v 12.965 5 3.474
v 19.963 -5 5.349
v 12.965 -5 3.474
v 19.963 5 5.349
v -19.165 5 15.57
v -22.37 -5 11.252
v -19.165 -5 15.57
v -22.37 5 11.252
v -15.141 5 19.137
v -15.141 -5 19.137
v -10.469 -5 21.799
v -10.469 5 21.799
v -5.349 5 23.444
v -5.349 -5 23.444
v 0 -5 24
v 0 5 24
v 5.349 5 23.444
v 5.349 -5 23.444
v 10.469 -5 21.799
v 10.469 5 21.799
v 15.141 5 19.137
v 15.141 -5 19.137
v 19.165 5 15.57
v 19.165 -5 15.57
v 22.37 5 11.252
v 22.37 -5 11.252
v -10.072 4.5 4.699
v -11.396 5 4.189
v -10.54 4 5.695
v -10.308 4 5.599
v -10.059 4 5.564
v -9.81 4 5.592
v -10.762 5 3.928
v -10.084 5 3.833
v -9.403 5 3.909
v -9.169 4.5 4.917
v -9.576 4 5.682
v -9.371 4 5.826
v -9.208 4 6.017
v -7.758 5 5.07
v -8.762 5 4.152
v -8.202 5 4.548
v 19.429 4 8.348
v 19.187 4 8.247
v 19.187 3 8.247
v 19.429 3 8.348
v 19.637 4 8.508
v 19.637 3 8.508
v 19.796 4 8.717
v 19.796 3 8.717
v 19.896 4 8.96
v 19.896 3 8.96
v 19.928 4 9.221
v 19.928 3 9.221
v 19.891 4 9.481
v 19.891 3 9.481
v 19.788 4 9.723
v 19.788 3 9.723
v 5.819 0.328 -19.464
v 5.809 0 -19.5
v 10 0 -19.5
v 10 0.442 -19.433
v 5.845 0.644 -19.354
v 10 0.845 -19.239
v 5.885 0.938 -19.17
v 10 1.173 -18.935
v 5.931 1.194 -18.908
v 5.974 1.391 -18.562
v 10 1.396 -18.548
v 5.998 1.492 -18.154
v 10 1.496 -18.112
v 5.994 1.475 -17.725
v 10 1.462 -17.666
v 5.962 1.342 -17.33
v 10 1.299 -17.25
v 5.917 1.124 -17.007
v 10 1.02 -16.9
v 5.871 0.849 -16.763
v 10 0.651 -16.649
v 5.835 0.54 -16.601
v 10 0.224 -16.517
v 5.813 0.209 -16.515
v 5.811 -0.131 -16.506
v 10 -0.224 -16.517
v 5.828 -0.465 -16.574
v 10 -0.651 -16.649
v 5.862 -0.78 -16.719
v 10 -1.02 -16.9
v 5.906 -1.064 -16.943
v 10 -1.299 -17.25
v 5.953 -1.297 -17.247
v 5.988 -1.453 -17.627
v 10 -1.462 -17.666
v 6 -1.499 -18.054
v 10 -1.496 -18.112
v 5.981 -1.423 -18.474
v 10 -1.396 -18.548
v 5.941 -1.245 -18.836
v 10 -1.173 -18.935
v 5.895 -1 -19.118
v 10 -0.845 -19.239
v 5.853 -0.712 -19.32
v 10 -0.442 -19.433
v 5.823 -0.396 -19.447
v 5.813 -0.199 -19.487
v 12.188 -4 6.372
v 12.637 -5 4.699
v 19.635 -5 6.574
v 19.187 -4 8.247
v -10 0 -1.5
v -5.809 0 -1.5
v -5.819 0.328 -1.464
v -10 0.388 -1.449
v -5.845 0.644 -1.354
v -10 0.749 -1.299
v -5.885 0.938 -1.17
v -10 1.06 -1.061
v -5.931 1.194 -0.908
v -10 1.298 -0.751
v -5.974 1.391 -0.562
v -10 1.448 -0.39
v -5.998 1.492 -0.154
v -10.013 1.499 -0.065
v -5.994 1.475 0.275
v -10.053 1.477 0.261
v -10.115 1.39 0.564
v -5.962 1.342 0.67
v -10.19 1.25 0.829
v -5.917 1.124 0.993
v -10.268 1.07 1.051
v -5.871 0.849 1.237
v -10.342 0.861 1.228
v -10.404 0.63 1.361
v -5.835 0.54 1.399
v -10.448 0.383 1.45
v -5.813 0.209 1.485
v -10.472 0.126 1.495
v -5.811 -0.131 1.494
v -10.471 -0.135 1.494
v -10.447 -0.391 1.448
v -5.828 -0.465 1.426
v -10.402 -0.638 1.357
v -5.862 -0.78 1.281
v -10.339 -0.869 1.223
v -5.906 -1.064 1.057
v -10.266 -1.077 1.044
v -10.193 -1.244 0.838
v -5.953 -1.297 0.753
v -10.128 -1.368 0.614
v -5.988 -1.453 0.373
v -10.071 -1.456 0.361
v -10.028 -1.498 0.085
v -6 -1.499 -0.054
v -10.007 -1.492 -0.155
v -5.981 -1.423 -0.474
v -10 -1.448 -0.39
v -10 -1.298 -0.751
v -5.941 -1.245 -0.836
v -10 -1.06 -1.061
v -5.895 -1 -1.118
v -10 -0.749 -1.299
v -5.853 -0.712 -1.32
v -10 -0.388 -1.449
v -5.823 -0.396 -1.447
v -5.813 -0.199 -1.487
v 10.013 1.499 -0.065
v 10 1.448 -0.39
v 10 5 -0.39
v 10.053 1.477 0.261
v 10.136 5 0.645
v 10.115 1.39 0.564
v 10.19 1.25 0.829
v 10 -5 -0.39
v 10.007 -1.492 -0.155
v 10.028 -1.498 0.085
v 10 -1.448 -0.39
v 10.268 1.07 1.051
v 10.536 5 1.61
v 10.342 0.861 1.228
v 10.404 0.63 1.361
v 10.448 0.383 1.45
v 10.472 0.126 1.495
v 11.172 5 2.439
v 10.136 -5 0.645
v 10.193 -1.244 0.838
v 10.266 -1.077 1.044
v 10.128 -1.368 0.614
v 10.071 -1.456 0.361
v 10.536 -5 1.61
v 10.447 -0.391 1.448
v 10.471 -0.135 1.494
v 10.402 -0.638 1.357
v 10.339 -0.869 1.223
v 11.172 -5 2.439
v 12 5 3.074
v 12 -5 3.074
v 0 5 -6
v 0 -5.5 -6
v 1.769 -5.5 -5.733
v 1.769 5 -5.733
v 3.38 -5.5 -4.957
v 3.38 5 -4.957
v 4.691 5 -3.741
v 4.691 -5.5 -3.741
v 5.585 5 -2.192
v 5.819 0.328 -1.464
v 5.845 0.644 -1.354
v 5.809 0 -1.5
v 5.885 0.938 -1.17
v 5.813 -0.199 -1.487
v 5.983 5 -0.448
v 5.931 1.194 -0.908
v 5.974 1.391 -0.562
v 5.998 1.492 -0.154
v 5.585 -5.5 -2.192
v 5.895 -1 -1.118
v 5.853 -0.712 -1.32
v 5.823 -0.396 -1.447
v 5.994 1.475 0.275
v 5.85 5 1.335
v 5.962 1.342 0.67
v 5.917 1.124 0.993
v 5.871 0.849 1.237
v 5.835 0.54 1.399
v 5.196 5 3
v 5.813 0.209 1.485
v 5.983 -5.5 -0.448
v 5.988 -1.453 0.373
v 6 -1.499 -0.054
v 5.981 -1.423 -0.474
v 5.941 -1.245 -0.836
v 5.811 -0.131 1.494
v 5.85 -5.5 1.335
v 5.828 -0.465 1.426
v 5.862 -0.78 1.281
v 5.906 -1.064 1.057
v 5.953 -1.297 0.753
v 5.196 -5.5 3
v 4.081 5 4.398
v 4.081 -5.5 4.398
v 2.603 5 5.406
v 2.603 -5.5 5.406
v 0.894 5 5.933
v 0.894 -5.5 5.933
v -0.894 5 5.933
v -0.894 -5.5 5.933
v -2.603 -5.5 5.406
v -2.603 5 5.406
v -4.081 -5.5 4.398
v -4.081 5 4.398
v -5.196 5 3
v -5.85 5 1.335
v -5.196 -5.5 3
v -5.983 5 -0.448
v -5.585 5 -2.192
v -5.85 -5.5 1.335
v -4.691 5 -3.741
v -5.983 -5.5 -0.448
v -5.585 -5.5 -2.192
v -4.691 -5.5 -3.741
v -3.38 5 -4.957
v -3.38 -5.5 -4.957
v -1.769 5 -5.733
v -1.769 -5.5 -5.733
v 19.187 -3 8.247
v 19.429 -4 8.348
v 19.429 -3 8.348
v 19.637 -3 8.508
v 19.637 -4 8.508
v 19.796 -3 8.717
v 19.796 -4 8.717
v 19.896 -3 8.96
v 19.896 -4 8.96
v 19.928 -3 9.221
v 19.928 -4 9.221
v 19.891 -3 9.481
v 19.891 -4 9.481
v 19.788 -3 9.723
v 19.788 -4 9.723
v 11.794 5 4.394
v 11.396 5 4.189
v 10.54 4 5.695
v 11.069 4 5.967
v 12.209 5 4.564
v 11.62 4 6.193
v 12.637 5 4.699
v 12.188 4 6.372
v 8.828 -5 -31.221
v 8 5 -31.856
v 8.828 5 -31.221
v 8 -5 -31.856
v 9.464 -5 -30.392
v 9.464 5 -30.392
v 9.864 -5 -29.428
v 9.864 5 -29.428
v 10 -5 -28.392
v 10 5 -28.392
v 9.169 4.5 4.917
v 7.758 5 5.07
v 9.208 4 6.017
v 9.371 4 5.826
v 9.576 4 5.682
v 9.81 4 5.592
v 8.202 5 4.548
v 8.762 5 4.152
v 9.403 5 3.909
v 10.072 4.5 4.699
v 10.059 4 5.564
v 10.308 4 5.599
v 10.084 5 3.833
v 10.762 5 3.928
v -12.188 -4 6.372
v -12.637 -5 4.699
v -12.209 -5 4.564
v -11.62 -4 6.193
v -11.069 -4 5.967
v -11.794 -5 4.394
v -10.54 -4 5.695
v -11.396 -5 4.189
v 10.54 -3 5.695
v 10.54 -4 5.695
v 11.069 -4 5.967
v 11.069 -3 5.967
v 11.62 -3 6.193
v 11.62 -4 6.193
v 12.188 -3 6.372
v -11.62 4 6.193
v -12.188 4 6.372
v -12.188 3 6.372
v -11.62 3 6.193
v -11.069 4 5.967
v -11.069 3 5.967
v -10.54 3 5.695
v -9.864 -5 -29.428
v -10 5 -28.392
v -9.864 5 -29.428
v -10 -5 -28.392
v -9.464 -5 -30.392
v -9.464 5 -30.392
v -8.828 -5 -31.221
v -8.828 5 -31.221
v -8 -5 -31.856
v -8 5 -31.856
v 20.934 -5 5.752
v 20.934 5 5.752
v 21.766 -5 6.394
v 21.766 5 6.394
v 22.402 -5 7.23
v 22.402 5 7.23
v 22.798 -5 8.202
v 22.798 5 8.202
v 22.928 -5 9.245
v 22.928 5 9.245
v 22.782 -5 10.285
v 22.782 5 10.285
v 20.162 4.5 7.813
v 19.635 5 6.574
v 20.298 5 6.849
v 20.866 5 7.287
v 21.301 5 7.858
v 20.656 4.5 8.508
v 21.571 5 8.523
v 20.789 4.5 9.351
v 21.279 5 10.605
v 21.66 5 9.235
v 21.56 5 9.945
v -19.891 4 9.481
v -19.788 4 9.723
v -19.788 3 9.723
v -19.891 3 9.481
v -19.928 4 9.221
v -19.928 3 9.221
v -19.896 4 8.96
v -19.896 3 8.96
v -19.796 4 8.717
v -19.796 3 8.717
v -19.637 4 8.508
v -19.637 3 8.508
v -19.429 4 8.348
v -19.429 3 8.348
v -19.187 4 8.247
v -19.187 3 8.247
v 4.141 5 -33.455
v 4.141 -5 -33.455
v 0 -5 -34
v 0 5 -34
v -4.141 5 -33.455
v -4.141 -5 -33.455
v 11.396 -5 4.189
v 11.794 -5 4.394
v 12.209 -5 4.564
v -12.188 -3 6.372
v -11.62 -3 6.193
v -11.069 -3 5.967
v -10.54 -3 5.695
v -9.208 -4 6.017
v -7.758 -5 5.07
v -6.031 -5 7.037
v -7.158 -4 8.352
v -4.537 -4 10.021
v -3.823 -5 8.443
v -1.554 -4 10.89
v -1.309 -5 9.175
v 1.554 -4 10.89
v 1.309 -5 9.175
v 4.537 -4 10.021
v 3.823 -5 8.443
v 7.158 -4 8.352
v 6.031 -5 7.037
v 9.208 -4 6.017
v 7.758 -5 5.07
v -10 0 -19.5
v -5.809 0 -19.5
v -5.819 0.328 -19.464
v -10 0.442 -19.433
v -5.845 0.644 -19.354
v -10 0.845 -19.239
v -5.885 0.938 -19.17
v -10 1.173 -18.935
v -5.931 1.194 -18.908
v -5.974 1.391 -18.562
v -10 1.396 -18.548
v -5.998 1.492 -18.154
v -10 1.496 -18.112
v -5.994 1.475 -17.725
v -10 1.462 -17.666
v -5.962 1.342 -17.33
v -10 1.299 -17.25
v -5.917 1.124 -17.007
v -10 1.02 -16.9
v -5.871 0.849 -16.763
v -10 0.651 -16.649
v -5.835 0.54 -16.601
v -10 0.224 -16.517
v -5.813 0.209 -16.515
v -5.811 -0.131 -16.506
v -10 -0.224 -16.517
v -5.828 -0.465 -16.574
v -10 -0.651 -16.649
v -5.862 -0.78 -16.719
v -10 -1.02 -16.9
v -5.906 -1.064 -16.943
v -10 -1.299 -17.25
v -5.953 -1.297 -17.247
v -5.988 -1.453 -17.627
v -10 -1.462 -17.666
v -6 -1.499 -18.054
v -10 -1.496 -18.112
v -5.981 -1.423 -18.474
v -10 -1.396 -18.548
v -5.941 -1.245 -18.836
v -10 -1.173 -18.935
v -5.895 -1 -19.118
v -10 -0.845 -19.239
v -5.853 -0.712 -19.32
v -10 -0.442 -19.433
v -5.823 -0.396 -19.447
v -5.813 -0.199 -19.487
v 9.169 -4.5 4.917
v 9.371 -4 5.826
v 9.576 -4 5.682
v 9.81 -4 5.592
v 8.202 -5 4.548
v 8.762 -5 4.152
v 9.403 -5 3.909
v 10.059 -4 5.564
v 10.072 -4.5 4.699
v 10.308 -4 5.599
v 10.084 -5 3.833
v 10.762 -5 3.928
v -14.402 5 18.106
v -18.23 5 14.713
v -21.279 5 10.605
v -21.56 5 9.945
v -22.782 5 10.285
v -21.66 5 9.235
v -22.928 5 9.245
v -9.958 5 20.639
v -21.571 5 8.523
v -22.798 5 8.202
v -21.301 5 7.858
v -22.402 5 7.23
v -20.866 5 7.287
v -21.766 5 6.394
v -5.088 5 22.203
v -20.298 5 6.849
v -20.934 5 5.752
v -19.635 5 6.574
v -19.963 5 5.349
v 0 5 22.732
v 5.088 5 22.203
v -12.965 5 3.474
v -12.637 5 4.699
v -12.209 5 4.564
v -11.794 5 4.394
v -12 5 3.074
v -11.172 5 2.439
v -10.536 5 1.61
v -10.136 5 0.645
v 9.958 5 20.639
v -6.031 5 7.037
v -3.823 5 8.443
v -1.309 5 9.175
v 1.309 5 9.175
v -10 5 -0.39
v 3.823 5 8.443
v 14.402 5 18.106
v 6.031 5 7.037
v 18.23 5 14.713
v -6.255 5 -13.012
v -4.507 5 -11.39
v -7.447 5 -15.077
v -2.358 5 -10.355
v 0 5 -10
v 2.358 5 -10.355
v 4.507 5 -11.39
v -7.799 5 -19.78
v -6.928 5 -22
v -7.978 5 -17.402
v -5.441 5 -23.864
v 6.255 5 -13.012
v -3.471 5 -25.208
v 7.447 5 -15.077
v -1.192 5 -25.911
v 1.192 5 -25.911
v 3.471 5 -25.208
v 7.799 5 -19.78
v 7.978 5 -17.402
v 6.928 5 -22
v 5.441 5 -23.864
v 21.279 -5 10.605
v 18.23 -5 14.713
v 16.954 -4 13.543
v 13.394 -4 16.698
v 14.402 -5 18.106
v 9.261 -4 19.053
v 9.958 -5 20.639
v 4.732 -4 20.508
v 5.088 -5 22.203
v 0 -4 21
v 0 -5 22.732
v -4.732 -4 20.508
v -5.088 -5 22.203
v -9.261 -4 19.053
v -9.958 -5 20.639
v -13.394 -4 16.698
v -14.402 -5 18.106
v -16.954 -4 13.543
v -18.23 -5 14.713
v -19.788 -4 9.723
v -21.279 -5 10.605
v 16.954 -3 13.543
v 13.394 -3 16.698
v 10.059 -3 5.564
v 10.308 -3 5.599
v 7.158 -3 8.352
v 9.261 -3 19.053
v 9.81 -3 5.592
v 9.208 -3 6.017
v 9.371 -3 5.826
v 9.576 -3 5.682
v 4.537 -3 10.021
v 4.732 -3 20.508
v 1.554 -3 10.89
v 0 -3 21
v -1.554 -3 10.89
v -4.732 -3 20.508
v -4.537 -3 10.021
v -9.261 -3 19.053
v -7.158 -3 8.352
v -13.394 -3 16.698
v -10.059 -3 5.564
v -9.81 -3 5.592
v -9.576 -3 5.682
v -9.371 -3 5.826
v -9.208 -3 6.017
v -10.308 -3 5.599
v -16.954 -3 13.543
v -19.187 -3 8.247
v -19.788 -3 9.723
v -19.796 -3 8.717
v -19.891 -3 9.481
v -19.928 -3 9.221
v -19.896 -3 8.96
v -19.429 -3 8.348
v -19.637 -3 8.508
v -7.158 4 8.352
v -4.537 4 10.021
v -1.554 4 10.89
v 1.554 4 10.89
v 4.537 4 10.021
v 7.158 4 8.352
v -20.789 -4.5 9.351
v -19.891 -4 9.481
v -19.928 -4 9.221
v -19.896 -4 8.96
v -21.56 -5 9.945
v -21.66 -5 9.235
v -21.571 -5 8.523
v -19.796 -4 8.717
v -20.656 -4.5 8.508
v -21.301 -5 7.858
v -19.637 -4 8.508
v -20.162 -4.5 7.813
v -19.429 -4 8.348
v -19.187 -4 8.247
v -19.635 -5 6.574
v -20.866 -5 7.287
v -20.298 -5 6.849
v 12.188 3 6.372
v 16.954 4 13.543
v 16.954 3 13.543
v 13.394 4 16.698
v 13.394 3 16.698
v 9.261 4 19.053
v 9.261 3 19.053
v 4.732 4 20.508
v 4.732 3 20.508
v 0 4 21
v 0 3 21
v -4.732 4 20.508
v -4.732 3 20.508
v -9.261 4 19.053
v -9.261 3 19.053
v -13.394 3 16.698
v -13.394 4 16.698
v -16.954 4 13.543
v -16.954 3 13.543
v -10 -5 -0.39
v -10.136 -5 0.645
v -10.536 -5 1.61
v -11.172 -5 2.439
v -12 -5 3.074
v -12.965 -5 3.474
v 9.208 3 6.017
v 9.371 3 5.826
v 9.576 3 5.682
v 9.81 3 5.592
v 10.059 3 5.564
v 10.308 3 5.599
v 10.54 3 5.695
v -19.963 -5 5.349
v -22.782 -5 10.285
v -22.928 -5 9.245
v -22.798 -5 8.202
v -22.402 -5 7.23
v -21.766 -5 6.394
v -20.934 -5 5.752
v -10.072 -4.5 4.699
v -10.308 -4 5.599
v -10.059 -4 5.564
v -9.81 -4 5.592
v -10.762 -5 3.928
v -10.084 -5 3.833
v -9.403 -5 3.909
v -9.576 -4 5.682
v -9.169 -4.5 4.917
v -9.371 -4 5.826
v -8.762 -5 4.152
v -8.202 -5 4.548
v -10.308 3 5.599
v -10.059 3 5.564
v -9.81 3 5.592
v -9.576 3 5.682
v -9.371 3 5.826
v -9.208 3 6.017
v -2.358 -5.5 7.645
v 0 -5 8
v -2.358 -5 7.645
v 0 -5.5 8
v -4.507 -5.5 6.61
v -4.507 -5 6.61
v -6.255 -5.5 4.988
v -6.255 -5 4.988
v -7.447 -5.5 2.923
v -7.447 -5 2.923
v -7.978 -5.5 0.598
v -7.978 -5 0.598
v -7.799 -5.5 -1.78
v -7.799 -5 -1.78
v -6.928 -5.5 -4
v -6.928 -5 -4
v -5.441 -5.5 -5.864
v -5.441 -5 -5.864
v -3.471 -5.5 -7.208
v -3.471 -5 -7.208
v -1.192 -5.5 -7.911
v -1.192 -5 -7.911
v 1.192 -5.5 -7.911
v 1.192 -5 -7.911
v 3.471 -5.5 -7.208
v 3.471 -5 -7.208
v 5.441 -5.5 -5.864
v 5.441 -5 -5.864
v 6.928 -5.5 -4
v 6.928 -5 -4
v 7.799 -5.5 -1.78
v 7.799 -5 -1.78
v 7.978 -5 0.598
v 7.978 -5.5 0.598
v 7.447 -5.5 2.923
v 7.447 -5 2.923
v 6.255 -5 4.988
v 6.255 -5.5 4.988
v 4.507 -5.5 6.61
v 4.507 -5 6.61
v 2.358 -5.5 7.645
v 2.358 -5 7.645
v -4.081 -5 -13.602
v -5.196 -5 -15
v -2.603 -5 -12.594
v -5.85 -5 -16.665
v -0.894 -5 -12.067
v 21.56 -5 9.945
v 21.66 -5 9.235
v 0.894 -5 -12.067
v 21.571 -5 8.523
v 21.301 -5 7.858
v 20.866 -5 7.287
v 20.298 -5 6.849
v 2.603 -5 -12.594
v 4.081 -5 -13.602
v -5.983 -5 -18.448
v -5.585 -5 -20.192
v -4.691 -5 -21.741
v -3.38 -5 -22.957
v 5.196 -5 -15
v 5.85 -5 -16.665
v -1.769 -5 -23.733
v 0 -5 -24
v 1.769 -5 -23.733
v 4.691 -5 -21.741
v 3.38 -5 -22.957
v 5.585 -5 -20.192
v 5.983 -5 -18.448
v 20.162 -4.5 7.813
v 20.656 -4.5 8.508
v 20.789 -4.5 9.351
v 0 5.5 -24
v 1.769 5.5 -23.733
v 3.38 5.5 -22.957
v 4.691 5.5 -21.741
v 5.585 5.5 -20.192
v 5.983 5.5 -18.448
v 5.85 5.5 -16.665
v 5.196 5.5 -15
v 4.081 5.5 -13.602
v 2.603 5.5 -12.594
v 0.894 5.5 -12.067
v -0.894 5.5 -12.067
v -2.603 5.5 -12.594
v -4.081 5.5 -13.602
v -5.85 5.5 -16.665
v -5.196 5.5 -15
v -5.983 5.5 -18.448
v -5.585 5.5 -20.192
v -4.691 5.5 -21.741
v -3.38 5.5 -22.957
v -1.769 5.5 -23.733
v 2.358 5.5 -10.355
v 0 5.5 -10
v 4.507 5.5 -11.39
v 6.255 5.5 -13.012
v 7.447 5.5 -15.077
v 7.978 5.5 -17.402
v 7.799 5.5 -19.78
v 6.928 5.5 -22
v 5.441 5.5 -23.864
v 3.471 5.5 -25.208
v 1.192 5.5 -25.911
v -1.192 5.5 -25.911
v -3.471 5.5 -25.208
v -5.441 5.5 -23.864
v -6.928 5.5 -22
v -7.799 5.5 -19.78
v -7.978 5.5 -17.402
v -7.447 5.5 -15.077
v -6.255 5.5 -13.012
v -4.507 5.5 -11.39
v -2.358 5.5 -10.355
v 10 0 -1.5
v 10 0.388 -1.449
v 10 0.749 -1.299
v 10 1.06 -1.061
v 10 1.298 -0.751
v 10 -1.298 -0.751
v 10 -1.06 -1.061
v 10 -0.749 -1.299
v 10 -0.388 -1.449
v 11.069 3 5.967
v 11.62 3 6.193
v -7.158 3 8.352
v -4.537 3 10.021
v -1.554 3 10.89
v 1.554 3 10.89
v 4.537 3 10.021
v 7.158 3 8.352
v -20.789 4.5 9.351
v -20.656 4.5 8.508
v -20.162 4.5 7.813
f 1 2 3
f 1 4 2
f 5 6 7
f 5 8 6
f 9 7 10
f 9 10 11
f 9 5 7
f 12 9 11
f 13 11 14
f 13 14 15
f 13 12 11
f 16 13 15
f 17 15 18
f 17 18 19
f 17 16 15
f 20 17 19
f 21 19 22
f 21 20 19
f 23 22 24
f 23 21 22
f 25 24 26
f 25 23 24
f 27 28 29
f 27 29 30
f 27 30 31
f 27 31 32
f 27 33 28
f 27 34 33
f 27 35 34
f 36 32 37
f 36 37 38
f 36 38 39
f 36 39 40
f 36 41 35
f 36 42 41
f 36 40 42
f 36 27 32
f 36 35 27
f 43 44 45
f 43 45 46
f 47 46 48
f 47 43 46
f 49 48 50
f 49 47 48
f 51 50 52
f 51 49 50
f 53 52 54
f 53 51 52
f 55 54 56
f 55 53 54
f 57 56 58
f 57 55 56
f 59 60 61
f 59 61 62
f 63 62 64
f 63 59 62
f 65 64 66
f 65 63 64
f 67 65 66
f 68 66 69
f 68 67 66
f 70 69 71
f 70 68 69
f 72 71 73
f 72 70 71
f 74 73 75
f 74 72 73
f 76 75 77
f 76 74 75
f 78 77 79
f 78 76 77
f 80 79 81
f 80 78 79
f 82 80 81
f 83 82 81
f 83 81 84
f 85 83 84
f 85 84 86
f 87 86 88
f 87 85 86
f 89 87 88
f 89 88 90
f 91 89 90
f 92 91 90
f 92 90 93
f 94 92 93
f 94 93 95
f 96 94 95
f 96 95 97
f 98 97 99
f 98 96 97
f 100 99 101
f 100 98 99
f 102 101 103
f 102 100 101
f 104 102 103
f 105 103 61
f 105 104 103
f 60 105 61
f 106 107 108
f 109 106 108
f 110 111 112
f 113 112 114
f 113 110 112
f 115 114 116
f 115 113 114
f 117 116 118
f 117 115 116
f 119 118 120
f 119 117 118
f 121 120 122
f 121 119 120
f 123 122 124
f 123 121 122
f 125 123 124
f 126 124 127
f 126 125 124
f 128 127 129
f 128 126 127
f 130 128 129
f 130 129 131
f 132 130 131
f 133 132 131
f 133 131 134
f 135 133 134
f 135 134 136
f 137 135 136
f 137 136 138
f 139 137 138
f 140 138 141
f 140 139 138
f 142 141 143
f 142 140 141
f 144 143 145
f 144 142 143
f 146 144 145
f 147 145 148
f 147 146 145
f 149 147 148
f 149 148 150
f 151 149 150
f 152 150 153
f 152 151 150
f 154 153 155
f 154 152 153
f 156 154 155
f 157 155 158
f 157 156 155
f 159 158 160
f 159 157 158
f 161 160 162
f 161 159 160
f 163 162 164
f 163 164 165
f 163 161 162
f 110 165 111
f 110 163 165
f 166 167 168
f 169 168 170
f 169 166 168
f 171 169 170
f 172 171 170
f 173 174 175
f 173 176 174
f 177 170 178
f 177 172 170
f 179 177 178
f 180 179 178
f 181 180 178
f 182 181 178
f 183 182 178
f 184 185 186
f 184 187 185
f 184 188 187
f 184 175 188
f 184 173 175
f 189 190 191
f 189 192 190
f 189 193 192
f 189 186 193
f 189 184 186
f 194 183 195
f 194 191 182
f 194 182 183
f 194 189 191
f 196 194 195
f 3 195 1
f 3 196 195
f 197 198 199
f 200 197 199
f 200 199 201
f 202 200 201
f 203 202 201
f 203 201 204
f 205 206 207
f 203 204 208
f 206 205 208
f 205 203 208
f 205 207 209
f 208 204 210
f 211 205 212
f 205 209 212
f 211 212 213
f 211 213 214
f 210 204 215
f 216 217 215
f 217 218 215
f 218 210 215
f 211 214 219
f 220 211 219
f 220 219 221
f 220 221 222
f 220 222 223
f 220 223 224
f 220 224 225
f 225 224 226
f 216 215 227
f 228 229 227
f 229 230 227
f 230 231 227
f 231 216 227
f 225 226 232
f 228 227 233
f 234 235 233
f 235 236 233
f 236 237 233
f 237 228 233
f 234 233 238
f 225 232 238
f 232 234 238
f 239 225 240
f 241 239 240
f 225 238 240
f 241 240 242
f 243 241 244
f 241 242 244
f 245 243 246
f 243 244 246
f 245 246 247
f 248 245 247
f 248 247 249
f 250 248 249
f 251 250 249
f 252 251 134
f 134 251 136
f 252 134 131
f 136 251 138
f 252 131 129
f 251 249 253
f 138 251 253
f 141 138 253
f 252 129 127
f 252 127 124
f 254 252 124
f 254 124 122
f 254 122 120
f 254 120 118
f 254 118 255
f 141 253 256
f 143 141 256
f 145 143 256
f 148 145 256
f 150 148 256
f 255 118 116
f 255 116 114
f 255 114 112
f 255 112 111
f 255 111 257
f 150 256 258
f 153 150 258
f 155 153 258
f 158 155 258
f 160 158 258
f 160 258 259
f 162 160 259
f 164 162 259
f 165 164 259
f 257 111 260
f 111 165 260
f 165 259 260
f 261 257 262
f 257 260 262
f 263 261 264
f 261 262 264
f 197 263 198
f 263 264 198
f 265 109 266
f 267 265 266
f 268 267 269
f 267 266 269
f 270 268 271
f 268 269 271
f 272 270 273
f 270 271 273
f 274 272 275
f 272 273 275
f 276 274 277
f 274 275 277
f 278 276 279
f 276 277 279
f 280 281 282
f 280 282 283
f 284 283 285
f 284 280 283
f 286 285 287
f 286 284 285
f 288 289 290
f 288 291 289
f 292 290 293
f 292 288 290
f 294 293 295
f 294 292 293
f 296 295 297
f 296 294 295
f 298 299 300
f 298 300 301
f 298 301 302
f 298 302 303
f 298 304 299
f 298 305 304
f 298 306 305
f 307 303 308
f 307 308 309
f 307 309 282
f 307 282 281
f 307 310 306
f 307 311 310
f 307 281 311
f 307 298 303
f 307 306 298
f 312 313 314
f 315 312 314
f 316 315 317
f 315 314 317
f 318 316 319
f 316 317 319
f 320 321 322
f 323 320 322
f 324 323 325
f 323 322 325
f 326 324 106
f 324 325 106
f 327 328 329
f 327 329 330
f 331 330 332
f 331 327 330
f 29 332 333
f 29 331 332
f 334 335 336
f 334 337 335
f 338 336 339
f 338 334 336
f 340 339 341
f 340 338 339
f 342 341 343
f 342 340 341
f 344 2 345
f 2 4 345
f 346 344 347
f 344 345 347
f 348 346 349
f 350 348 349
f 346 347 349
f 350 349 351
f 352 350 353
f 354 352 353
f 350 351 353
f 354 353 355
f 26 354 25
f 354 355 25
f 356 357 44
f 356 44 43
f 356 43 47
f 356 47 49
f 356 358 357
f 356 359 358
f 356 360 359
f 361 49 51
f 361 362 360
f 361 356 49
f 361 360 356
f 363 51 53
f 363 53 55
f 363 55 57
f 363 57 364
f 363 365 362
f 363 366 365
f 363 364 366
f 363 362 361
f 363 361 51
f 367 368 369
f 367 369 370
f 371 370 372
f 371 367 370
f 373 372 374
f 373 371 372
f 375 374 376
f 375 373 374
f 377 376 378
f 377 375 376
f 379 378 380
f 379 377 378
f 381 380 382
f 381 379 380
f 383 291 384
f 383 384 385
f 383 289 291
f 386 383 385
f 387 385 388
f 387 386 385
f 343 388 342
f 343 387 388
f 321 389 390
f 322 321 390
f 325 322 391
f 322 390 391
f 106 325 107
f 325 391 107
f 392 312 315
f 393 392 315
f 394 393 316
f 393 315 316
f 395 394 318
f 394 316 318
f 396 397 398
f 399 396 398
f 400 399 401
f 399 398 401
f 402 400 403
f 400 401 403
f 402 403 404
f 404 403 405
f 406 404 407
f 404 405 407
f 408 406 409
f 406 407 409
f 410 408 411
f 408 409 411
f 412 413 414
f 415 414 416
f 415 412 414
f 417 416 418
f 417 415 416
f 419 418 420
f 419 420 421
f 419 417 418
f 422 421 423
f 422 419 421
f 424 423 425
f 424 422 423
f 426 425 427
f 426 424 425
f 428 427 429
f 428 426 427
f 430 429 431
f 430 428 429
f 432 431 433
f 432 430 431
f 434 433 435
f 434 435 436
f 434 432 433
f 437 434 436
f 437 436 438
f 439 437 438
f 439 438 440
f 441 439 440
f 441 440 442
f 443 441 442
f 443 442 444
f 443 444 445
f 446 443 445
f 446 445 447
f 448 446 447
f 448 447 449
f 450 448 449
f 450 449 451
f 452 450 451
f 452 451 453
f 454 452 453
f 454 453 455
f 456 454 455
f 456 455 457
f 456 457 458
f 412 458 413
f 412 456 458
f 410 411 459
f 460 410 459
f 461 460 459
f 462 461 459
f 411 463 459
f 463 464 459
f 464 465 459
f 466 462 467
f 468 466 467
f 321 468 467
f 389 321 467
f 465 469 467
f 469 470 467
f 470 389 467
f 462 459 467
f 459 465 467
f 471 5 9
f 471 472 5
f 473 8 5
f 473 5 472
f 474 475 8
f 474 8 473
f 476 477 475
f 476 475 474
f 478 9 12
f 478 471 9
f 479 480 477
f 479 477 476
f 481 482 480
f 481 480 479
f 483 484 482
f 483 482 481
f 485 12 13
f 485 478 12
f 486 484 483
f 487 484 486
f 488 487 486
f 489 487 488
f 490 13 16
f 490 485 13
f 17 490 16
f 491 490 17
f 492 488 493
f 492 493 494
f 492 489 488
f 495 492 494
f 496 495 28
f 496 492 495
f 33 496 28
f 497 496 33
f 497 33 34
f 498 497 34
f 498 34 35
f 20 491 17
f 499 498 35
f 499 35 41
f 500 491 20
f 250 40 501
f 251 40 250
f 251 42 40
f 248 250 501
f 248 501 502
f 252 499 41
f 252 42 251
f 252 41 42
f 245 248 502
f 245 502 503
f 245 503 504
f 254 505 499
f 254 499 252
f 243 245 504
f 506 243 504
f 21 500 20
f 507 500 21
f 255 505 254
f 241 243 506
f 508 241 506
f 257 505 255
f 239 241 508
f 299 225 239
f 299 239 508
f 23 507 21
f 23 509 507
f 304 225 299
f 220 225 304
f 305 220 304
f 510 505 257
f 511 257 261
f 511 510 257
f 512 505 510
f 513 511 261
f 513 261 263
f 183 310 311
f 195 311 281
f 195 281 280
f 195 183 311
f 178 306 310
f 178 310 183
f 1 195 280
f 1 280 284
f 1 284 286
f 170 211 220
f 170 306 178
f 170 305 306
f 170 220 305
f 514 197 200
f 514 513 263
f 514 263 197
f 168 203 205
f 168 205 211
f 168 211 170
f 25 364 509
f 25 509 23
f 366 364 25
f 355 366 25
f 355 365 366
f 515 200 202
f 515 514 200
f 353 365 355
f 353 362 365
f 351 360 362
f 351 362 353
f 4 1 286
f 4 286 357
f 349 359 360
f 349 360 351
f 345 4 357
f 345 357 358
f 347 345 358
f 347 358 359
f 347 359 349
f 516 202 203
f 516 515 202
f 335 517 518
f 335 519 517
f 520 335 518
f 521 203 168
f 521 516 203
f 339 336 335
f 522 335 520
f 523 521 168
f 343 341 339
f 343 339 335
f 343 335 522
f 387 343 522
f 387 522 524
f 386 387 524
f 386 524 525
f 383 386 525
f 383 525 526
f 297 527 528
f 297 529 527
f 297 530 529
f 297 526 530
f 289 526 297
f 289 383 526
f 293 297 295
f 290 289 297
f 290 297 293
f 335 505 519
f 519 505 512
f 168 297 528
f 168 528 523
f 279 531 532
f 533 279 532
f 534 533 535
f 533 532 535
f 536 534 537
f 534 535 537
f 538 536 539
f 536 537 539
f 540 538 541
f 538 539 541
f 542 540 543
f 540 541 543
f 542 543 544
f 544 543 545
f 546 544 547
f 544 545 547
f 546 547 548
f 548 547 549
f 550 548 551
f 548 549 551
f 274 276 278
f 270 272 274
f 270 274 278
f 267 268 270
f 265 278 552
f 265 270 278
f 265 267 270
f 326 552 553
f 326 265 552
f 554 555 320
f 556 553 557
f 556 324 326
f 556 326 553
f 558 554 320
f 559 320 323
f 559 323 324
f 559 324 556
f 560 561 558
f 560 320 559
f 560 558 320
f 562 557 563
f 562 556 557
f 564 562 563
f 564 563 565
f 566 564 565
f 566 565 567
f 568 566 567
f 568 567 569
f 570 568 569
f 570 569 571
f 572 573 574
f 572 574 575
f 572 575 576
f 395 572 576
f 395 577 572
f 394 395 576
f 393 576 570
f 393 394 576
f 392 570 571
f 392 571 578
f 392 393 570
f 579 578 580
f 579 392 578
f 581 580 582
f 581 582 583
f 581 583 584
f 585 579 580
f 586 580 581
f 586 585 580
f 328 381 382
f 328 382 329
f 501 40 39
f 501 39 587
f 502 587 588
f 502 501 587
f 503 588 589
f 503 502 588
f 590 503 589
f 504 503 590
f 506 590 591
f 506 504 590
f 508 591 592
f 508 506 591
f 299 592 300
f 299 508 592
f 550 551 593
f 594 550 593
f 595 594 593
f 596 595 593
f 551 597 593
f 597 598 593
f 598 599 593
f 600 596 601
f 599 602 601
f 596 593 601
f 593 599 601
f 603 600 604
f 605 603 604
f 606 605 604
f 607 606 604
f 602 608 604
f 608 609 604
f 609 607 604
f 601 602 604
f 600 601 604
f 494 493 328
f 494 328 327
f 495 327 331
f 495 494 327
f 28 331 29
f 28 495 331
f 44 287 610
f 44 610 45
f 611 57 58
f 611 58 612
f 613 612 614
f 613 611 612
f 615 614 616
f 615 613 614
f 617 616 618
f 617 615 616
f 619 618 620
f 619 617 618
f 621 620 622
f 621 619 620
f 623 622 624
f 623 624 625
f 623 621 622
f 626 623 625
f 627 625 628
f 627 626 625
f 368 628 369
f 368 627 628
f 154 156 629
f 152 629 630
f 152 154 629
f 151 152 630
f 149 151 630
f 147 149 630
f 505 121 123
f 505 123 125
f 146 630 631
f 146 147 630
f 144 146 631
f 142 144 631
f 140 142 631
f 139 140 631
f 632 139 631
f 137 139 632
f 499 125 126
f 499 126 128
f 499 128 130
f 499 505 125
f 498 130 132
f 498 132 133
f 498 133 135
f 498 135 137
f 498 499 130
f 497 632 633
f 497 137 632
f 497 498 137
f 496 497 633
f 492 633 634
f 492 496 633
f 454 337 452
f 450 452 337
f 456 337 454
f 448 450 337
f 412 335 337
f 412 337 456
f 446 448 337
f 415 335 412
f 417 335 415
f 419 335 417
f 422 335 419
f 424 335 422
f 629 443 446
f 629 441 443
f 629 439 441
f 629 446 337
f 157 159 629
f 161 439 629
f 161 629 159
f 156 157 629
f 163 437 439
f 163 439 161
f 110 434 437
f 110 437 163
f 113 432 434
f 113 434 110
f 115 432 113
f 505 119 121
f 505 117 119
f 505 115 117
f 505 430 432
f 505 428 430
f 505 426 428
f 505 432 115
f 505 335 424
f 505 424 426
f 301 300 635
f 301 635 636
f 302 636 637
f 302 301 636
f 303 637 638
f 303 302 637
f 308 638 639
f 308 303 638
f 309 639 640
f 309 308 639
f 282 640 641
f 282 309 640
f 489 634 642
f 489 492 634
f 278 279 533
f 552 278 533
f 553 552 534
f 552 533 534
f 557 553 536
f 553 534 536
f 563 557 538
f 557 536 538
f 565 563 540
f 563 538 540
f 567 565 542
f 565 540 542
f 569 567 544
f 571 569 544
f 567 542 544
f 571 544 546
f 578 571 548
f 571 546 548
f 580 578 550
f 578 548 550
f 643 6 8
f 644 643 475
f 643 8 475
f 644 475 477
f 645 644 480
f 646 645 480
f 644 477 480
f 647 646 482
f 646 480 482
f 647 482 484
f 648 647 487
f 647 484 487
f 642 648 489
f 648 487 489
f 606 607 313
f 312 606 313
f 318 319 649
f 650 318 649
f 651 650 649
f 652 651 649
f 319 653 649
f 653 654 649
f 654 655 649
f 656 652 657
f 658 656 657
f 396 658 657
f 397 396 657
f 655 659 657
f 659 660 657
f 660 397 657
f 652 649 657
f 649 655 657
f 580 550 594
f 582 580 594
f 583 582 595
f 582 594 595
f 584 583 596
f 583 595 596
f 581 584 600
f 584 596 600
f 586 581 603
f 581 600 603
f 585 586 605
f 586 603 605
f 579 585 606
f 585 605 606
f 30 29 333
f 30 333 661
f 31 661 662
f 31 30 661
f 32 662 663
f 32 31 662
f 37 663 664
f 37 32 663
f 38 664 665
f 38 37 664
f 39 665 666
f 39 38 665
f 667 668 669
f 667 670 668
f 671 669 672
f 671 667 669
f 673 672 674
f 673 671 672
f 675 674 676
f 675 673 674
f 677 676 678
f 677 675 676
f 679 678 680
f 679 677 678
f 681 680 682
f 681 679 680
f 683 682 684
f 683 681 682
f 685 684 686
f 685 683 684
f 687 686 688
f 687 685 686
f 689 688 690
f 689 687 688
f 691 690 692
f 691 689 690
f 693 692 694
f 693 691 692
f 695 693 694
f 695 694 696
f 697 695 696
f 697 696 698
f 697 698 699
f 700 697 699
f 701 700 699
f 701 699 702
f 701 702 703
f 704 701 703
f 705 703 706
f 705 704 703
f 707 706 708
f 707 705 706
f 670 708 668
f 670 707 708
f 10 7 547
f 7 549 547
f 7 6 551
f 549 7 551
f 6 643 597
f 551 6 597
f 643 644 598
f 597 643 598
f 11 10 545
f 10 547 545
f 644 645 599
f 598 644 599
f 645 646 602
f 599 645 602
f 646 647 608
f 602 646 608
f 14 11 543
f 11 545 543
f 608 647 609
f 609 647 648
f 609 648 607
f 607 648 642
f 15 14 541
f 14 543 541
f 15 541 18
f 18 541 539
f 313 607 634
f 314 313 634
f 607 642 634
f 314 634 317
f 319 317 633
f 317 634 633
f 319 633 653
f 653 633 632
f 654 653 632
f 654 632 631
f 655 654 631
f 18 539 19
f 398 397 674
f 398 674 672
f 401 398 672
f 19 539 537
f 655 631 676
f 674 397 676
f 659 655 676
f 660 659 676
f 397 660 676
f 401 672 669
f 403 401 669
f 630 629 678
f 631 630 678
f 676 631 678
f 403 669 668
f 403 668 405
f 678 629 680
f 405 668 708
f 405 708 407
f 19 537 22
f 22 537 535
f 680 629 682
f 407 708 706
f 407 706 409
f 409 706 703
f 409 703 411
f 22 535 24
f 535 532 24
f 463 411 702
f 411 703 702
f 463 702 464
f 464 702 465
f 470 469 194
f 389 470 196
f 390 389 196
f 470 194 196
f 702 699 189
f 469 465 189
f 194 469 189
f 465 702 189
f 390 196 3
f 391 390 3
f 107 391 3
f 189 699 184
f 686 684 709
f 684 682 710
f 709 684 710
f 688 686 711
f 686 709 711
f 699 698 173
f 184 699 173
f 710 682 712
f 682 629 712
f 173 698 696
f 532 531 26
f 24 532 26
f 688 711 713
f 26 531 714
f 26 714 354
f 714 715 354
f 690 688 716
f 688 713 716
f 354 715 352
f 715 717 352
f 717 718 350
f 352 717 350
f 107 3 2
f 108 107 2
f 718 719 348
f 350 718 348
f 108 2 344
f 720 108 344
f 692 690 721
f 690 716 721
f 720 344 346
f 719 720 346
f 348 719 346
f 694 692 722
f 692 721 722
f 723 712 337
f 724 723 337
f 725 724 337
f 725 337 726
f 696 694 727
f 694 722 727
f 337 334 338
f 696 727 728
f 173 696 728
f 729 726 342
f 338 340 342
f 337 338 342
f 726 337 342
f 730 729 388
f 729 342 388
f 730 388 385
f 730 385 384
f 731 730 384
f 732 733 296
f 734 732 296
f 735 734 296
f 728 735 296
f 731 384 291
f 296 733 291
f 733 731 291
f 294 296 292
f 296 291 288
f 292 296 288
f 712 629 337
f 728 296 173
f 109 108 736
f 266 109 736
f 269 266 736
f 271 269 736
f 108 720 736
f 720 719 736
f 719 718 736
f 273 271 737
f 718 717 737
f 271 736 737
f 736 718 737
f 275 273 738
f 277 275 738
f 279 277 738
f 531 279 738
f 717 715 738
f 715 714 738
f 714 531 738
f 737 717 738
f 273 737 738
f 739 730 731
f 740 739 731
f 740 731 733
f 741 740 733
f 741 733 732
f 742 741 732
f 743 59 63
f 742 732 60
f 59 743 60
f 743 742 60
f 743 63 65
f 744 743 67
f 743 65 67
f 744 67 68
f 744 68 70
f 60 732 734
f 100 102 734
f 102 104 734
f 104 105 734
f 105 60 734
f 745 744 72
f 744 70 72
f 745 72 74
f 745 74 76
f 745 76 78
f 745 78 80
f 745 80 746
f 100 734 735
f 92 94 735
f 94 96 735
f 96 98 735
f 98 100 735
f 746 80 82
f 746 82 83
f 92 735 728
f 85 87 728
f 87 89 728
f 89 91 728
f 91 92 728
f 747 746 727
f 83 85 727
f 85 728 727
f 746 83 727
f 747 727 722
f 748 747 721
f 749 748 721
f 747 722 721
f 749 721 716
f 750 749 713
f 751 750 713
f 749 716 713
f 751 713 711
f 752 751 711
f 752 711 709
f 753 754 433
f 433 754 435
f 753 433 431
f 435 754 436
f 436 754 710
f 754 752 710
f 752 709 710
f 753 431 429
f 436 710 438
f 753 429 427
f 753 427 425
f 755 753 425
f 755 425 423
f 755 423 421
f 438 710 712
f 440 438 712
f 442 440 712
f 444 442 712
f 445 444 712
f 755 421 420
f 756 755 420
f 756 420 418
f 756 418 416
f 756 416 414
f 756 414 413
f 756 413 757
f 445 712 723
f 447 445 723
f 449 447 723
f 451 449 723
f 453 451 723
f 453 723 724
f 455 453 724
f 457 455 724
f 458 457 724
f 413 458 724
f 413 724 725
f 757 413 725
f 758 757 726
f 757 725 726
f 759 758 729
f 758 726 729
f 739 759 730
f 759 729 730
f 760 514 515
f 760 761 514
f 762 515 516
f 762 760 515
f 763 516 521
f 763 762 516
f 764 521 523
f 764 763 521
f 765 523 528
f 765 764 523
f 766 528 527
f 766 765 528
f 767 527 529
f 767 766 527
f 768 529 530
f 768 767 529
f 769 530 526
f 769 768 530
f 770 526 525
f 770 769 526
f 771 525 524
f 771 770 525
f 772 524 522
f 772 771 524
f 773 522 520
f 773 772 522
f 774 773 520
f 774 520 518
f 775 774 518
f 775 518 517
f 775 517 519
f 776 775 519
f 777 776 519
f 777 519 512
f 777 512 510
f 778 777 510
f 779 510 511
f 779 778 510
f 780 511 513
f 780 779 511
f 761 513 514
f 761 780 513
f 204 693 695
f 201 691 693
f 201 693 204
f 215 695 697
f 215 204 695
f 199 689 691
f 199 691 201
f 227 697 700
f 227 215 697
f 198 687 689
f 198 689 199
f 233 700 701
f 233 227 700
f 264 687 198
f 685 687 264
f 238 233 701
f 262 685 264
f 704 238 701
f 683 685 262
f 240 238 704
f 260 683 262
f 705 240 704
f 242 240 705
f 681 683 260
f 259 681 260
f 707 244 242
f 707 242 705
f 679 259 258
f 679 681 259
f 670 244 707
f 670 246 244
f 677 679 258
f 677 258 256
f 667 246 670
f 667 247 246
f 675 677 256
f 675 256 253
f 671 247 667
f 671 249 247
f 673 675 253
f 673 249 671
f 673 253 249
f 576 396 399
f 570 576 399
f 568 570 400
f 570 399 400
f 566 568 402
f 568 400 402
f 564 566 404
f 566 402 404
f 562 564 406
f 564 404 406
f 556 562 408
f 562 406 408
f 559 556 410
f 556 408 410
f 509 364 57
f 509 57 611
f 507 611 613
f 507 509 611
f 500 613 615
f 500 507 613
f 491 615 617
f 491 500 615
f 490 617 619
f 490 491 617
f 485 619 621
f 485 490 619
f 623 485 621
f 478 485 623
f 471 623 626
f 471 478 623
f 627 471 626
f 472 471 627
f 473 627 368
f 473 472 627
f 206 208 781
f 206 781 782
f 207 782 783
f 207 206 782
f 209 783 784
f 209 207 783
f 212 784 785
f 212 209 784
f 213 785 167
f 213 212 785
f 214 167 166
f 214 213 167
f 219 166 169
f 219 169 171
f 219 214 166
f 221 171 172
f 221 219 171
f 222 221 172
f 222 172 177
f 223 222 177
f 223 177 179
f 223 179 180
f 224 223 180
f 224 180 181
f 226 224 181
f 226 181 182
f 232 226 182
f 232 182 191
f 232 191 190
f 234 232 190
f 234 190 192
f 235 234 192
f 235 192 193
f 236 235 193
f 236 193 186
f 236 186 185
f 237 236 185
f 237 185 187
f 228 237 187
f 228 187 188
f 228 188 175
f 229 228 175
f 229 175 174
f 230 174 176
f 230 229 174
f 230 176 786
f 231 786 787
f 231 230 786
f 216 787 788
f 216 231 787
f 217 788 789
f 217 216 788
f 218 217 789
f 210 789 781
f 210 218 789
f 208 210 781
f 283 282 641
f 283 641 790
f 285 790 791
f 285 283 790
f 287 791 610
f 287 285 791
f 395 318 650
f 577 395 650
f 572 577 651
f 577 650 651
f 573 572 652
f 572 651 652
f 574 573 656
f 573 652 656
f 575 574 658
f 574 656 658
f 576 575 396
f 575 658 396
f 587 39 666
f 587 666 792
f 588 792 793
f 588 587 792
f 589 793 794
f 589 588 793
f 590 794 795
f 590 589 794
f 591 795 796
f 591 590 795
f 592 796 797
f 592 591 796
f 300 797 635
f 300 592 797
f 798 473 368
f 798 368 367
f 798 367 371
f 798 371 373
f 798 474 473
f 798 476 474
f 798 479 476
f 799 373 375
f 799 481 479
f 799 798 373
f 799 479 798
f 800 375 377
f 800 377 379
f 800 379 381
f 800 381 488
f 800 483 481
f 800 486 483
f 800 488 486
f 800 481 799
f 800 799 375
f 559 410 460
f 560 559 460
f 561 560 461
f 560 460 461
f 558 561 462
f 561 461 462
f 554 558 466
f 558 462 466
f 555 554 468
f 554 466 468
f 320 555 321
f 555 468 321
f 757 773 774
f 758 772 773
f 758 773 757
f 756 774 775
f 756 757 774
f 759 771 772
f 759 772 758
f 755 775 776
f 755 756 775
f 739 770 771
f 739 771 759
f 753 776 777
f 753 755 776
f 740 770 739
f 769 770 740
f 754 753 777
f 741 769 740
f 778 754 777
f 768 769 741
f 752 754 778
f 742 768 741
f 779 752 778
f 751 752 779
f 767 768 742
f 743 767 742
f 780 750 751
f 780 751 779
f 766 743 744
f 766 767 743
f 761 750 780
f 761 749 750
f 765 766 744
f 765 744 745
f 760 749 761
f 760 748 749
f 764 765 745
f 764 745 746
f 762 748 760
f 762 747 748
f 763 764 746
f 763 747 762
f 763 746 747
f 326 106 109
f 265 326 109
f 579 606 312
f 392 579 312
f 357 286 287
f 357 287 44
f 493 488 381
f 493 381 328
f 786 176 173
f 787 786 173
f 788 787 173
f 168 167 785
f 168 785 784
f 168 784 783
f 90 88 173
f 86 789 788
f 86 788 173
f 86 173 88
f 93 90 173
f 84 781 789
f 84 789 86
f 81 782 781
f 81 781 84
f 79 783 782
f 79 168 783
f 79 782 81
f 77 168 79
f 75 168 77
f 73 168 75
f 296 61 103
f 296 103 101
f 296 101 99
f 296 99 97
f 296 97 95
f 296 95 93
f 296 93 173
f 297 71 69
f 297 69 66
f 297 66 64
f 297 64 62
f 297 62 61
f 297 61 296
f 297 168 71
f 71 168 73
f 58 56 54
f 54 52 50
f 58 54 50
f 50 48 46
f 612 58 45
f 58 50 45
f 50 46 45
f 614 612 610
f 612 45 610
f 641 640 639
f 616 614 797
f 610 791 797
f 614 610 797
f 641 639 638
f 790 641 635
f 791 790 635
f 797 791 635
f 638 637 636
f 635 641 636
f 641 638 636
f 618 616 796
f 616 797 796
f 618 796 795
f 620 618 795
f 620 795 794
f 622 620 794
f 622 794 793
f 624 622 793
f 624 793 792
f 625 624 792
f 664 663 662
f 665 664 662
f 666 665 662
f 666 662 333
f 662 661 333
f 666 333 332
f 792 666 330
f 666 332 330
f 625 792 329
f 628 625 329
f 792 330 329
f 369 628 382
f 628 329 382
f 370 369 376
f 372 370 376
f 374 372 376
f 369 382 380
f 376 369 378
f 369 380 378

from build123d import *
from OCP.BRepFilletAPI import BRepFilletAPI_MakeChamfer

# Parameters (mm, degrees)
BOSS_EXTRUDE1_DEPTH     = 5
FILLET1_R               = 4
SKETCH3_R               = 8
BOSS_EXTRUDE2_DEPTH     = 0.5
SKETCH4_R               = 8
BOSS_EXTRUDE3_DEPTH     = 0.5
SKETCH5_R               = 6
CUT_EXTRUDE3_DEPTH      = 43.458169908
CUT_EXTRUDE4_DEPTH      = 2
CHAMFER1_SIZE           = 1
CHAMFER1_SIZE2          = 1.732050808
CHAMFER2_SIZE           = 1
CHAMFER2_SIZE2          = 1.732050808
CUT_EXTRUDE5_DEPTH      = 42.375671498
CUT_EXTRUDE5_DEPTH_BACK = 42.375671498
SKETCH7_R               = 1.5


with BuildPart() as part:
    # Sketch1 → Boss-Extrude1 (new, symmetric)
    with BuildSketch(Plane(origin=(0, 0, 0), x_dir=(1, 0, 0), z_dir=(0, 1, 0))):
        with BuildLine():
            Line((-10, 30.489995997), (-10, -2.679491924))
            Line((-10, -2.679491924), (-24.544650839, -6.576719371))
            ThreePointArc((-24.544650839, -6.576719371), (0, -24), (24.544650839, -6.576719371))
            Line((24.544650839, -6.576719371), (10, -2.679491924))
            Line((10, -2.679491924), (10, 30.489995997))
            ThreePointArc((10, 30.489995997), (0, 34), (-10, 30.489995997))
        make_face()
    extrude(amount=BOSS_EXTRUDE1_DEPTH, both=True)

    # Fillet1
    fillet1_edges = [part.edges().sort_by_distance(p)[0] for p in [
        (10, 0, -30.489995997),
        (10, 0, 2.679491924),
        (24.544650839, 0, 6.576719371),
        (-24.544650839, 0, 6.576719371),
        (-10, 0, 2.679491924),
        (-10, 0, -30.489995997),
    ]]
    fillet(fillet1_edges, radius=FILLET1_R)

    # Sketch3 → Boss-Extrude2 (add, symmetric)
    with BuildSketch(Plane.XZ.offset(5)):
        with Locations(Location((0, 0, 0), (0, 0, 90))):
            Circle(SKETCH3_R)
    extrude(amount=BOSS_EXTRUDE2_DEPTH, both=True)

    # Sketch4 → Boss-Extrude3 (add, symmetric)
    with BuildSketch(Plane(origin=(0, 5, 0), x_dir=(1, 0, 0), z_dir=(0, 1, 0))):
        with Locations(Location((0, 18, 0), (0, 0, 270))):
            Circle(SKETCH4_R)
    extrude(amount=BOSS_EXTRUDE3_DEPTH, both=True)

    # Sketch5 → Cut-Extrude3 (cut, through all)
    with BuildSketch(Plane.XZ.offset(5.5)):
        with Locations(Location((0, 0, 0), (0, 0, 270))):
            Circle(SKETCH5_R)
        with Locations(Location((0, -18, 0), (0, 0, 270))):
            Circle(SKETCH5_R)
    extrude(amount=-CUT_EXTRUDE3_DEPTH, mode=Mode.SUBTRACT)

    # Sketch6 → Cut-Extrude4 (cut)
    with BuildSketch(Plane(origin=(0, 5, 0), x_dir=(1, 0, 0), z_dir=(0, 1, 0))):
        with BuildLine():
            Line((12.188266684, -6.371664756), (19.186884641, -8.246938786))
            ThreePointArc((19.186884641, -8.246938786), (19.854075356, -8.835365045), (19.788432213, -9.722540276))
            ThreePointArc((19.788432213, -9.722540276), (0, -21), (-19.788432213, -9.722540276))
            ThreePointArc((-19.788432213, -9.722540276), (-19.854075356, -8.835365045), (-19.186884641, -8.246938786))
            Line((-19.186884641, -8.246938786), (-12.188266684, -6.371664756))
            ThreePointArc((-12.188266684, -6.371664756), (-11.342355786, -6.086056673), (-10.539679728, -5.695098402))
            ThreePointArc((-10.539679728, -5.695098402), (-9.810114884, -5.592432974), (-9.208235905, -6.017340901))
            ThreePointArc((-9.208235905, -6.017340901), (0, -11), (9.208235905, -6.017340901))
            ThreePointArc((9.208235905, -6.017340901), (9.810114884, -5.592432974), (10.539679728, -5.695098402))
            ThreePointArc((10.539679728, -5.695098402), (11.342355786, -6.086056673), (12.188266684, -6.371664756))
        make_face()
    cut_extrude4 = extrude(amount=-CUT_EXTRUDE4_DEPTH, mode=Mode.SUBTRACT)

    # Chamfer1: one chamfer whose edges measure the first distance from different faces: ONE call of the kernel's chamfer builder (chamfer() names one face for all edges)
    chamfer1_edges_1 = [part.edges().sort_by_distance(p)[0] for p in [
        (9.810114884, 5, 5.592432974),
    ]]
    chamfer1_side_1 = [part.faces().sort_by_distance(p)[0] for p in [
        (9.810114884, 4, 5.592432974),
    ]]
    chamfer1_edges_2 = [part.edges().sort_by_distance(p)[0] for p in [
        (0, 5, 11),
    ]]
    chamfer1_side_2 = [part.faces().sort_by_distance(p)[0] for p in [
        (0, 4, 11),
    ]]
    chamfer1_edges_3 = [part.edges().sort_by_distance(p)[0] for p in [
        (-9.810114884, 5, 5.592432974),
    ]]
    chamfer1_side_3 = [part.faces().sort_by_distance(p)[0] for p in [
        (-9.810114884, 4, 5.592432974),
    ]]
    chamfer1_edges_4 = [part.edges().sort_by_distance(p)[0] for p in [
        (-11.342355786, 5, 6.086056673),
    ]]
    chamfer1_side_4 = [part.faces().sort_by_distance(p)[0] for p in [
        (-11.342355786, 4, 6.086056673),
    ]]
    chamfer1_edges_5 = [part.edges().sort_by_distance(p)[0] for p in [
        (-15.687575662, 5, 7.309301771),
    ]]
    chamfer1_side_5 = [part.faces().sort_by_distance(p)[0] for p in [
        (-15.687575662, 4, 7.309301771),
    ]]
    chamfer1_edges_6 = [part.edges().sort_by_distance(p)[0] for p in [
        (-19.854075356, 5, 8.835365045),
    ]]
    chamfer1_side_6 = [part.faces().sort_by_distance(p)[0] for p in [
        (-19.854075356, 4, 8.835365045),
    ]]
    chamfer1_edges_7 = [part.edges().sort_by_distance(p)[0] for p in [
        (0, 5, 21),
    ]]
    chamfer1_side_7 = [part.faces().sort_by_distance(p)[0] for p in [
        (0, 4, 21),
    ]]
    chamfer1_edges_8 = [part.edges().sort_by_distance(p)[0] for p in [
        (19.854075356, 5, 8.835365045),
    ]]
    chamfer1_side_8 = [part.faces().sort_by_distance(p)[0] for p in [
        (19.854075356, 4, 8.835365045),
    ]]
    chamfer1_edges_9 = [part.edges().sort_by_distance(p)[0] for p in [
        (15.687575662, 5, 7.309301771),
    ]]
    chamfer1_side_9 = [part.faces().sort_by_distance(p)[0] for p in [
        (15.687575662, 4, 7.309301771),
    ]]
    chamfer1_edges_10 = [part.edges().sort_by_distance(p)[0] for p in [
        (11.342355786, 5, 6.086056673),
    ]]
    chamfer1_side_10 = [part.faces().sort_by_distance(p)[0] for p in [
        (11.342355786, 4, 6.086056673),
    ]]
    chamfer1 = BRepFilletAPI_MakeChamfer(part.part.solid().wrapped)
    for e in chamfer1_edges_1:
        chamfer1.Add(CHAMFER1_SIZE, CHAMFER1_SIZE2, e.wrapped, chamfer1_side_1[0].wrapped)  # the first distance lies on this face
    for e in chamfer1_edges_2:
        chamfer1.Add(CHAMFER1_SIZE, CHAMFER1_SIZE2, e.wrapped, chamfer1_side_2[0].wrapped)  # the first distance lies on this face
    for e in chamfer1_edges_3:
        chamfer1.Add(CHAMFER1_SIZE, CHAMFER1_SIZE2, e.wrapped, chamfer1_side_3[0].wrapped)  # the first distance lies on this face
    for e in chamfer1_edges_4:
        chamfer1.Add(CHAMFER1_SIZE, CHAMFER1_SIZE2, e.wrapped, chamfer1_side_4[0].wrapped)  # the first distance lies on this face
    for e in chamfer1_edges_5:
        chamfer1.Add(CHAMFER1_SIZE, CHAMFER1_SIZE2, e.wrapped, chamfer1_side_5[0].wrapped)  # the first distance lies on this face
    for e in chamfer1_edges_6:
        chamfer1.Add(CHAMFER1_SIZE, CHAMFER1_SIZE2, e.wrapped, chamfer1_side_6[0].wrapped)  # the first distance lies on this face
    for e in chamfer1_edges_7:
        chamfer1.Add(CHAMFER1_SIZE, CHAMFER1_SIZE2, e.wrapped, chamfer1_side_7[0].wrapped)  # the first distance lies on this face
    for e in chamfer1_edges_8:
        chamfer1.Add(CHAMFER1_SIZE, CHAMFER1_SIZE2, e.wrapped, chamfer1_side_8[0].wrapped)  # the first distance lies on this face
    for e in chamfer1_edges_9:
        chamfer1.Add(CHAMFER1_SIZE, CHAMFER1_SIZE2, e.wrapped, chamfer1_side_9[0].wrapped)  # the first distance lies on this face
    for e in chamfer1_edges_10:
        chamfer1.Add(CHAMFER1_SIZE, CHAMFER1_SIZE2, e.wrapped, chamfer1_side_10[0].wrapped)  # the first distance lies on this face
    add(Compound.cast(chamfer1.Shape()), mode=Mode.REPLACE)

    # Mirror5: Cut-Extrude4 across plane
    add(cut_extrude4.mirror(Plane.ZX), mode=Mode.SUBTRACT)

    # Chamfer2: one chamfer whose edges measure the first distance from different faces: ONE call of the kernel's chamfer builder (chamfer() names one face for all edges)
    chamfer2_edges_1 = [part.edges().sort_by_distance(p)[0] for p in [
        (9.810114884, -5, 5.592432974),
    ]]
    chamfer2_side_1 = [part.faces().sort_by_distance(p)[0] for p in [
        (9.810114884, -4, 5.592432974),
    ]]
    chamfer2_edges_2 = [part.edges().sort_by_distance(p)[0] for p in [
        (0, -5, 11),
    ]]
    chamfer2_side_2 = [part.faces().sort_by_distance(p)[0] for p in [
        (0, -4, 11),
    ]]
    chamfer2_edges_3 = [part.edges().sort_by_distance(p)[0] for p in [
        (-9.810114884, -5, 5.592432974),
    ]]
    chamfer2_side_3 = [part.faces().sort_by_distance(p)[0] for p in [
        (-9.810114884, -4, 5.592432974),
    ]]
    chamfer2_edges_4 = [part.edges().sort_by_distance(p)[0] for p in [
        (-11.342355786, -5, 6.086056673),
    ]]
    chamfer2_side_4 = [part.faces().sort_by_distance(p)[0] for p in [
        (-11.342355786, -4, 6.086056673),
    ]]
    chamfer2_edges_5 = [part.edges().sort_by_distance(p)[0] for p in [
        (-15.687575662, -5, 7.309301771),
    ]]
    chamfer2_side_5 = [part.faces().sort_by_distance(p)[0] for p in [
        (-15.687575662, -4, 7.309301771),
    ]]
    chamfer2_edges_6 = [part.edges().sort_by_distance(p)[0] for p in [
        (-19.854075356, -5, 8.835365045),
    ]]
    chamfer2_side_6 = [part.faces().sort_by_distance(p)[0] for p in [
        (-19.854075356, -4, 8.835365045),
    ]]
    chamfer2_edges_7 = [part.edges().sort_by_distance(p)[0] for p in [
        (0, -5, 21),
    ]]
    chamfer2_side_7 = [part.faces().sort_by_distance(p)[0] for p in [
        (0, -4, 21),
    ]]
    chamfer2_edges_8 = [part.edges().sort_by_distance(p)[0] for p in [
        (19.854075356, -5, 8.835365045),
    ]]
    chamfer2_side_8 = [part.faces().sort_by_distance(p)[0] for p in [
        (19.854075356, -4, 8.835365045),
    ]]
    chamfer2_edges_9 = [part.edges().sort_by_distance(p)[0] for p in [
        (15.687575662, -5, 7.309301771),
    ]]
    chamfer2_side_9 = [part.faces().sort_by_distance(p)[0] for p in [
        (15.687575662, -4, 7.309301771),
    ]]
    chamfer2_edges_10 = [part.edges().sort_by_distance(p)[0] for p in [
        (11.342355786, -5, 6.086056673),
    ]]
    chamfer2_side_10 = [part.faces().sort_by_distance(p)[0] for p in [
        (11.342355786, -4, 6.086056673),
    ]]
    chamfer2 = BRepFilletAPI_MakeChamfer(part.part.solid().wrapped)
    for e in chamfer2_edges_1:
        chamfer2.Add(CHAMFER2_SIZE, CHAMFER2_SIZE2, e.wrapped, chamfer2_side_1[0].wrapped)  # the first distance lies on this face
    for e in chamfer2_edges_2:
        chamfer2.Add(CHAMFER2_SIZE, CHAMFER2_SIZE2, e.wrapped, chamfer2_side_2[0].wrapped)  # the first distance lies on this face
    for e in chamfer2_edges_3:
        chamfer2.Add(CHAMFER2_SIZE, CHAMFER2_SIZE2, e.wrapped, chamfer2_side_3[0].wrapped)  # the first distance lies on this face
    for e in chamfer2_edges_4:
        chamfer2.Add(CHAMFER2_SIZE, CHAMFER2_SIZE2, e.wrapped, chamfer2_side_4[0].wrapped)  # the first distance lies on this face
    for e in chamfer2_edges_5:
        chamfer2.Add(CHAMFER2_SIZE, CHAMFER2_SIZE2, e.wrapped, chamfer2_side_5[0].wrapped)  # the first distance lies on this face
    for e in chamfer2_edges_6:
        chamfer2.Add(CHAMFER2_SIZE, CHAMFER2_SIZE2, e.wrapped, chamfer2_side_6[0].wrapped)  # the first distance lies on this face
    for e in chamfer2_edges_7:
        chamfer2.Add(CHAMFER2_SIZE, CHAMFER2_SIZE2, e.wrapped, chamfer2_side_7[0].wrapped)  # the first distance lies on this face
    for e in chamfer2_edges_8:
        chamfer2.Add(CHAMFER2_SIZE, CHAMFER2_SIZE2, e.wrapped, chamfer2_side_8[0].wrapped)  # the first distance lies on this face
    for e in chamfer2_edges_9:
        chamfer2.Add(CHAMFER2_SIZE, CHAMFER2_SIZE2, e.wrapped, chamfer2_side_9[0].wrapped)  # the first distance lies on this face
    for e in chamfer2_edges_10:
        chamfer2.Add(CHAMFER2_SIZE, CHAMFER2_SIZE2, e.wrapped, chamfer2_side_10[0].wrapped)  # the first distance lies on this face
    add(Compound.cast(chamfer2.Shape()), mode=Mode.REPLACE)

    # Sketch7 → Cut-Extrude5 (cut, two sides: drawn at the far end of the back side and taken through both)
    with BuildSketch(Plane(origin=(0, 0, 0), x_dir=(0, 0, -1), z_dir=(1, 0, 0)).offset(-CUT_EXTRUDE5_DEPTH_BACK)):
        Circle(SKETCH7_R)
        with Locations((18, 0)):
            Circle(SKETCH7_R)
    extrude(amount=CUT_EXTRUDE5_DEPTH + CUT_EXTRUDE5_DEPTH_BACK, mode=Mode.SUBTRACT)


solid = part.part
